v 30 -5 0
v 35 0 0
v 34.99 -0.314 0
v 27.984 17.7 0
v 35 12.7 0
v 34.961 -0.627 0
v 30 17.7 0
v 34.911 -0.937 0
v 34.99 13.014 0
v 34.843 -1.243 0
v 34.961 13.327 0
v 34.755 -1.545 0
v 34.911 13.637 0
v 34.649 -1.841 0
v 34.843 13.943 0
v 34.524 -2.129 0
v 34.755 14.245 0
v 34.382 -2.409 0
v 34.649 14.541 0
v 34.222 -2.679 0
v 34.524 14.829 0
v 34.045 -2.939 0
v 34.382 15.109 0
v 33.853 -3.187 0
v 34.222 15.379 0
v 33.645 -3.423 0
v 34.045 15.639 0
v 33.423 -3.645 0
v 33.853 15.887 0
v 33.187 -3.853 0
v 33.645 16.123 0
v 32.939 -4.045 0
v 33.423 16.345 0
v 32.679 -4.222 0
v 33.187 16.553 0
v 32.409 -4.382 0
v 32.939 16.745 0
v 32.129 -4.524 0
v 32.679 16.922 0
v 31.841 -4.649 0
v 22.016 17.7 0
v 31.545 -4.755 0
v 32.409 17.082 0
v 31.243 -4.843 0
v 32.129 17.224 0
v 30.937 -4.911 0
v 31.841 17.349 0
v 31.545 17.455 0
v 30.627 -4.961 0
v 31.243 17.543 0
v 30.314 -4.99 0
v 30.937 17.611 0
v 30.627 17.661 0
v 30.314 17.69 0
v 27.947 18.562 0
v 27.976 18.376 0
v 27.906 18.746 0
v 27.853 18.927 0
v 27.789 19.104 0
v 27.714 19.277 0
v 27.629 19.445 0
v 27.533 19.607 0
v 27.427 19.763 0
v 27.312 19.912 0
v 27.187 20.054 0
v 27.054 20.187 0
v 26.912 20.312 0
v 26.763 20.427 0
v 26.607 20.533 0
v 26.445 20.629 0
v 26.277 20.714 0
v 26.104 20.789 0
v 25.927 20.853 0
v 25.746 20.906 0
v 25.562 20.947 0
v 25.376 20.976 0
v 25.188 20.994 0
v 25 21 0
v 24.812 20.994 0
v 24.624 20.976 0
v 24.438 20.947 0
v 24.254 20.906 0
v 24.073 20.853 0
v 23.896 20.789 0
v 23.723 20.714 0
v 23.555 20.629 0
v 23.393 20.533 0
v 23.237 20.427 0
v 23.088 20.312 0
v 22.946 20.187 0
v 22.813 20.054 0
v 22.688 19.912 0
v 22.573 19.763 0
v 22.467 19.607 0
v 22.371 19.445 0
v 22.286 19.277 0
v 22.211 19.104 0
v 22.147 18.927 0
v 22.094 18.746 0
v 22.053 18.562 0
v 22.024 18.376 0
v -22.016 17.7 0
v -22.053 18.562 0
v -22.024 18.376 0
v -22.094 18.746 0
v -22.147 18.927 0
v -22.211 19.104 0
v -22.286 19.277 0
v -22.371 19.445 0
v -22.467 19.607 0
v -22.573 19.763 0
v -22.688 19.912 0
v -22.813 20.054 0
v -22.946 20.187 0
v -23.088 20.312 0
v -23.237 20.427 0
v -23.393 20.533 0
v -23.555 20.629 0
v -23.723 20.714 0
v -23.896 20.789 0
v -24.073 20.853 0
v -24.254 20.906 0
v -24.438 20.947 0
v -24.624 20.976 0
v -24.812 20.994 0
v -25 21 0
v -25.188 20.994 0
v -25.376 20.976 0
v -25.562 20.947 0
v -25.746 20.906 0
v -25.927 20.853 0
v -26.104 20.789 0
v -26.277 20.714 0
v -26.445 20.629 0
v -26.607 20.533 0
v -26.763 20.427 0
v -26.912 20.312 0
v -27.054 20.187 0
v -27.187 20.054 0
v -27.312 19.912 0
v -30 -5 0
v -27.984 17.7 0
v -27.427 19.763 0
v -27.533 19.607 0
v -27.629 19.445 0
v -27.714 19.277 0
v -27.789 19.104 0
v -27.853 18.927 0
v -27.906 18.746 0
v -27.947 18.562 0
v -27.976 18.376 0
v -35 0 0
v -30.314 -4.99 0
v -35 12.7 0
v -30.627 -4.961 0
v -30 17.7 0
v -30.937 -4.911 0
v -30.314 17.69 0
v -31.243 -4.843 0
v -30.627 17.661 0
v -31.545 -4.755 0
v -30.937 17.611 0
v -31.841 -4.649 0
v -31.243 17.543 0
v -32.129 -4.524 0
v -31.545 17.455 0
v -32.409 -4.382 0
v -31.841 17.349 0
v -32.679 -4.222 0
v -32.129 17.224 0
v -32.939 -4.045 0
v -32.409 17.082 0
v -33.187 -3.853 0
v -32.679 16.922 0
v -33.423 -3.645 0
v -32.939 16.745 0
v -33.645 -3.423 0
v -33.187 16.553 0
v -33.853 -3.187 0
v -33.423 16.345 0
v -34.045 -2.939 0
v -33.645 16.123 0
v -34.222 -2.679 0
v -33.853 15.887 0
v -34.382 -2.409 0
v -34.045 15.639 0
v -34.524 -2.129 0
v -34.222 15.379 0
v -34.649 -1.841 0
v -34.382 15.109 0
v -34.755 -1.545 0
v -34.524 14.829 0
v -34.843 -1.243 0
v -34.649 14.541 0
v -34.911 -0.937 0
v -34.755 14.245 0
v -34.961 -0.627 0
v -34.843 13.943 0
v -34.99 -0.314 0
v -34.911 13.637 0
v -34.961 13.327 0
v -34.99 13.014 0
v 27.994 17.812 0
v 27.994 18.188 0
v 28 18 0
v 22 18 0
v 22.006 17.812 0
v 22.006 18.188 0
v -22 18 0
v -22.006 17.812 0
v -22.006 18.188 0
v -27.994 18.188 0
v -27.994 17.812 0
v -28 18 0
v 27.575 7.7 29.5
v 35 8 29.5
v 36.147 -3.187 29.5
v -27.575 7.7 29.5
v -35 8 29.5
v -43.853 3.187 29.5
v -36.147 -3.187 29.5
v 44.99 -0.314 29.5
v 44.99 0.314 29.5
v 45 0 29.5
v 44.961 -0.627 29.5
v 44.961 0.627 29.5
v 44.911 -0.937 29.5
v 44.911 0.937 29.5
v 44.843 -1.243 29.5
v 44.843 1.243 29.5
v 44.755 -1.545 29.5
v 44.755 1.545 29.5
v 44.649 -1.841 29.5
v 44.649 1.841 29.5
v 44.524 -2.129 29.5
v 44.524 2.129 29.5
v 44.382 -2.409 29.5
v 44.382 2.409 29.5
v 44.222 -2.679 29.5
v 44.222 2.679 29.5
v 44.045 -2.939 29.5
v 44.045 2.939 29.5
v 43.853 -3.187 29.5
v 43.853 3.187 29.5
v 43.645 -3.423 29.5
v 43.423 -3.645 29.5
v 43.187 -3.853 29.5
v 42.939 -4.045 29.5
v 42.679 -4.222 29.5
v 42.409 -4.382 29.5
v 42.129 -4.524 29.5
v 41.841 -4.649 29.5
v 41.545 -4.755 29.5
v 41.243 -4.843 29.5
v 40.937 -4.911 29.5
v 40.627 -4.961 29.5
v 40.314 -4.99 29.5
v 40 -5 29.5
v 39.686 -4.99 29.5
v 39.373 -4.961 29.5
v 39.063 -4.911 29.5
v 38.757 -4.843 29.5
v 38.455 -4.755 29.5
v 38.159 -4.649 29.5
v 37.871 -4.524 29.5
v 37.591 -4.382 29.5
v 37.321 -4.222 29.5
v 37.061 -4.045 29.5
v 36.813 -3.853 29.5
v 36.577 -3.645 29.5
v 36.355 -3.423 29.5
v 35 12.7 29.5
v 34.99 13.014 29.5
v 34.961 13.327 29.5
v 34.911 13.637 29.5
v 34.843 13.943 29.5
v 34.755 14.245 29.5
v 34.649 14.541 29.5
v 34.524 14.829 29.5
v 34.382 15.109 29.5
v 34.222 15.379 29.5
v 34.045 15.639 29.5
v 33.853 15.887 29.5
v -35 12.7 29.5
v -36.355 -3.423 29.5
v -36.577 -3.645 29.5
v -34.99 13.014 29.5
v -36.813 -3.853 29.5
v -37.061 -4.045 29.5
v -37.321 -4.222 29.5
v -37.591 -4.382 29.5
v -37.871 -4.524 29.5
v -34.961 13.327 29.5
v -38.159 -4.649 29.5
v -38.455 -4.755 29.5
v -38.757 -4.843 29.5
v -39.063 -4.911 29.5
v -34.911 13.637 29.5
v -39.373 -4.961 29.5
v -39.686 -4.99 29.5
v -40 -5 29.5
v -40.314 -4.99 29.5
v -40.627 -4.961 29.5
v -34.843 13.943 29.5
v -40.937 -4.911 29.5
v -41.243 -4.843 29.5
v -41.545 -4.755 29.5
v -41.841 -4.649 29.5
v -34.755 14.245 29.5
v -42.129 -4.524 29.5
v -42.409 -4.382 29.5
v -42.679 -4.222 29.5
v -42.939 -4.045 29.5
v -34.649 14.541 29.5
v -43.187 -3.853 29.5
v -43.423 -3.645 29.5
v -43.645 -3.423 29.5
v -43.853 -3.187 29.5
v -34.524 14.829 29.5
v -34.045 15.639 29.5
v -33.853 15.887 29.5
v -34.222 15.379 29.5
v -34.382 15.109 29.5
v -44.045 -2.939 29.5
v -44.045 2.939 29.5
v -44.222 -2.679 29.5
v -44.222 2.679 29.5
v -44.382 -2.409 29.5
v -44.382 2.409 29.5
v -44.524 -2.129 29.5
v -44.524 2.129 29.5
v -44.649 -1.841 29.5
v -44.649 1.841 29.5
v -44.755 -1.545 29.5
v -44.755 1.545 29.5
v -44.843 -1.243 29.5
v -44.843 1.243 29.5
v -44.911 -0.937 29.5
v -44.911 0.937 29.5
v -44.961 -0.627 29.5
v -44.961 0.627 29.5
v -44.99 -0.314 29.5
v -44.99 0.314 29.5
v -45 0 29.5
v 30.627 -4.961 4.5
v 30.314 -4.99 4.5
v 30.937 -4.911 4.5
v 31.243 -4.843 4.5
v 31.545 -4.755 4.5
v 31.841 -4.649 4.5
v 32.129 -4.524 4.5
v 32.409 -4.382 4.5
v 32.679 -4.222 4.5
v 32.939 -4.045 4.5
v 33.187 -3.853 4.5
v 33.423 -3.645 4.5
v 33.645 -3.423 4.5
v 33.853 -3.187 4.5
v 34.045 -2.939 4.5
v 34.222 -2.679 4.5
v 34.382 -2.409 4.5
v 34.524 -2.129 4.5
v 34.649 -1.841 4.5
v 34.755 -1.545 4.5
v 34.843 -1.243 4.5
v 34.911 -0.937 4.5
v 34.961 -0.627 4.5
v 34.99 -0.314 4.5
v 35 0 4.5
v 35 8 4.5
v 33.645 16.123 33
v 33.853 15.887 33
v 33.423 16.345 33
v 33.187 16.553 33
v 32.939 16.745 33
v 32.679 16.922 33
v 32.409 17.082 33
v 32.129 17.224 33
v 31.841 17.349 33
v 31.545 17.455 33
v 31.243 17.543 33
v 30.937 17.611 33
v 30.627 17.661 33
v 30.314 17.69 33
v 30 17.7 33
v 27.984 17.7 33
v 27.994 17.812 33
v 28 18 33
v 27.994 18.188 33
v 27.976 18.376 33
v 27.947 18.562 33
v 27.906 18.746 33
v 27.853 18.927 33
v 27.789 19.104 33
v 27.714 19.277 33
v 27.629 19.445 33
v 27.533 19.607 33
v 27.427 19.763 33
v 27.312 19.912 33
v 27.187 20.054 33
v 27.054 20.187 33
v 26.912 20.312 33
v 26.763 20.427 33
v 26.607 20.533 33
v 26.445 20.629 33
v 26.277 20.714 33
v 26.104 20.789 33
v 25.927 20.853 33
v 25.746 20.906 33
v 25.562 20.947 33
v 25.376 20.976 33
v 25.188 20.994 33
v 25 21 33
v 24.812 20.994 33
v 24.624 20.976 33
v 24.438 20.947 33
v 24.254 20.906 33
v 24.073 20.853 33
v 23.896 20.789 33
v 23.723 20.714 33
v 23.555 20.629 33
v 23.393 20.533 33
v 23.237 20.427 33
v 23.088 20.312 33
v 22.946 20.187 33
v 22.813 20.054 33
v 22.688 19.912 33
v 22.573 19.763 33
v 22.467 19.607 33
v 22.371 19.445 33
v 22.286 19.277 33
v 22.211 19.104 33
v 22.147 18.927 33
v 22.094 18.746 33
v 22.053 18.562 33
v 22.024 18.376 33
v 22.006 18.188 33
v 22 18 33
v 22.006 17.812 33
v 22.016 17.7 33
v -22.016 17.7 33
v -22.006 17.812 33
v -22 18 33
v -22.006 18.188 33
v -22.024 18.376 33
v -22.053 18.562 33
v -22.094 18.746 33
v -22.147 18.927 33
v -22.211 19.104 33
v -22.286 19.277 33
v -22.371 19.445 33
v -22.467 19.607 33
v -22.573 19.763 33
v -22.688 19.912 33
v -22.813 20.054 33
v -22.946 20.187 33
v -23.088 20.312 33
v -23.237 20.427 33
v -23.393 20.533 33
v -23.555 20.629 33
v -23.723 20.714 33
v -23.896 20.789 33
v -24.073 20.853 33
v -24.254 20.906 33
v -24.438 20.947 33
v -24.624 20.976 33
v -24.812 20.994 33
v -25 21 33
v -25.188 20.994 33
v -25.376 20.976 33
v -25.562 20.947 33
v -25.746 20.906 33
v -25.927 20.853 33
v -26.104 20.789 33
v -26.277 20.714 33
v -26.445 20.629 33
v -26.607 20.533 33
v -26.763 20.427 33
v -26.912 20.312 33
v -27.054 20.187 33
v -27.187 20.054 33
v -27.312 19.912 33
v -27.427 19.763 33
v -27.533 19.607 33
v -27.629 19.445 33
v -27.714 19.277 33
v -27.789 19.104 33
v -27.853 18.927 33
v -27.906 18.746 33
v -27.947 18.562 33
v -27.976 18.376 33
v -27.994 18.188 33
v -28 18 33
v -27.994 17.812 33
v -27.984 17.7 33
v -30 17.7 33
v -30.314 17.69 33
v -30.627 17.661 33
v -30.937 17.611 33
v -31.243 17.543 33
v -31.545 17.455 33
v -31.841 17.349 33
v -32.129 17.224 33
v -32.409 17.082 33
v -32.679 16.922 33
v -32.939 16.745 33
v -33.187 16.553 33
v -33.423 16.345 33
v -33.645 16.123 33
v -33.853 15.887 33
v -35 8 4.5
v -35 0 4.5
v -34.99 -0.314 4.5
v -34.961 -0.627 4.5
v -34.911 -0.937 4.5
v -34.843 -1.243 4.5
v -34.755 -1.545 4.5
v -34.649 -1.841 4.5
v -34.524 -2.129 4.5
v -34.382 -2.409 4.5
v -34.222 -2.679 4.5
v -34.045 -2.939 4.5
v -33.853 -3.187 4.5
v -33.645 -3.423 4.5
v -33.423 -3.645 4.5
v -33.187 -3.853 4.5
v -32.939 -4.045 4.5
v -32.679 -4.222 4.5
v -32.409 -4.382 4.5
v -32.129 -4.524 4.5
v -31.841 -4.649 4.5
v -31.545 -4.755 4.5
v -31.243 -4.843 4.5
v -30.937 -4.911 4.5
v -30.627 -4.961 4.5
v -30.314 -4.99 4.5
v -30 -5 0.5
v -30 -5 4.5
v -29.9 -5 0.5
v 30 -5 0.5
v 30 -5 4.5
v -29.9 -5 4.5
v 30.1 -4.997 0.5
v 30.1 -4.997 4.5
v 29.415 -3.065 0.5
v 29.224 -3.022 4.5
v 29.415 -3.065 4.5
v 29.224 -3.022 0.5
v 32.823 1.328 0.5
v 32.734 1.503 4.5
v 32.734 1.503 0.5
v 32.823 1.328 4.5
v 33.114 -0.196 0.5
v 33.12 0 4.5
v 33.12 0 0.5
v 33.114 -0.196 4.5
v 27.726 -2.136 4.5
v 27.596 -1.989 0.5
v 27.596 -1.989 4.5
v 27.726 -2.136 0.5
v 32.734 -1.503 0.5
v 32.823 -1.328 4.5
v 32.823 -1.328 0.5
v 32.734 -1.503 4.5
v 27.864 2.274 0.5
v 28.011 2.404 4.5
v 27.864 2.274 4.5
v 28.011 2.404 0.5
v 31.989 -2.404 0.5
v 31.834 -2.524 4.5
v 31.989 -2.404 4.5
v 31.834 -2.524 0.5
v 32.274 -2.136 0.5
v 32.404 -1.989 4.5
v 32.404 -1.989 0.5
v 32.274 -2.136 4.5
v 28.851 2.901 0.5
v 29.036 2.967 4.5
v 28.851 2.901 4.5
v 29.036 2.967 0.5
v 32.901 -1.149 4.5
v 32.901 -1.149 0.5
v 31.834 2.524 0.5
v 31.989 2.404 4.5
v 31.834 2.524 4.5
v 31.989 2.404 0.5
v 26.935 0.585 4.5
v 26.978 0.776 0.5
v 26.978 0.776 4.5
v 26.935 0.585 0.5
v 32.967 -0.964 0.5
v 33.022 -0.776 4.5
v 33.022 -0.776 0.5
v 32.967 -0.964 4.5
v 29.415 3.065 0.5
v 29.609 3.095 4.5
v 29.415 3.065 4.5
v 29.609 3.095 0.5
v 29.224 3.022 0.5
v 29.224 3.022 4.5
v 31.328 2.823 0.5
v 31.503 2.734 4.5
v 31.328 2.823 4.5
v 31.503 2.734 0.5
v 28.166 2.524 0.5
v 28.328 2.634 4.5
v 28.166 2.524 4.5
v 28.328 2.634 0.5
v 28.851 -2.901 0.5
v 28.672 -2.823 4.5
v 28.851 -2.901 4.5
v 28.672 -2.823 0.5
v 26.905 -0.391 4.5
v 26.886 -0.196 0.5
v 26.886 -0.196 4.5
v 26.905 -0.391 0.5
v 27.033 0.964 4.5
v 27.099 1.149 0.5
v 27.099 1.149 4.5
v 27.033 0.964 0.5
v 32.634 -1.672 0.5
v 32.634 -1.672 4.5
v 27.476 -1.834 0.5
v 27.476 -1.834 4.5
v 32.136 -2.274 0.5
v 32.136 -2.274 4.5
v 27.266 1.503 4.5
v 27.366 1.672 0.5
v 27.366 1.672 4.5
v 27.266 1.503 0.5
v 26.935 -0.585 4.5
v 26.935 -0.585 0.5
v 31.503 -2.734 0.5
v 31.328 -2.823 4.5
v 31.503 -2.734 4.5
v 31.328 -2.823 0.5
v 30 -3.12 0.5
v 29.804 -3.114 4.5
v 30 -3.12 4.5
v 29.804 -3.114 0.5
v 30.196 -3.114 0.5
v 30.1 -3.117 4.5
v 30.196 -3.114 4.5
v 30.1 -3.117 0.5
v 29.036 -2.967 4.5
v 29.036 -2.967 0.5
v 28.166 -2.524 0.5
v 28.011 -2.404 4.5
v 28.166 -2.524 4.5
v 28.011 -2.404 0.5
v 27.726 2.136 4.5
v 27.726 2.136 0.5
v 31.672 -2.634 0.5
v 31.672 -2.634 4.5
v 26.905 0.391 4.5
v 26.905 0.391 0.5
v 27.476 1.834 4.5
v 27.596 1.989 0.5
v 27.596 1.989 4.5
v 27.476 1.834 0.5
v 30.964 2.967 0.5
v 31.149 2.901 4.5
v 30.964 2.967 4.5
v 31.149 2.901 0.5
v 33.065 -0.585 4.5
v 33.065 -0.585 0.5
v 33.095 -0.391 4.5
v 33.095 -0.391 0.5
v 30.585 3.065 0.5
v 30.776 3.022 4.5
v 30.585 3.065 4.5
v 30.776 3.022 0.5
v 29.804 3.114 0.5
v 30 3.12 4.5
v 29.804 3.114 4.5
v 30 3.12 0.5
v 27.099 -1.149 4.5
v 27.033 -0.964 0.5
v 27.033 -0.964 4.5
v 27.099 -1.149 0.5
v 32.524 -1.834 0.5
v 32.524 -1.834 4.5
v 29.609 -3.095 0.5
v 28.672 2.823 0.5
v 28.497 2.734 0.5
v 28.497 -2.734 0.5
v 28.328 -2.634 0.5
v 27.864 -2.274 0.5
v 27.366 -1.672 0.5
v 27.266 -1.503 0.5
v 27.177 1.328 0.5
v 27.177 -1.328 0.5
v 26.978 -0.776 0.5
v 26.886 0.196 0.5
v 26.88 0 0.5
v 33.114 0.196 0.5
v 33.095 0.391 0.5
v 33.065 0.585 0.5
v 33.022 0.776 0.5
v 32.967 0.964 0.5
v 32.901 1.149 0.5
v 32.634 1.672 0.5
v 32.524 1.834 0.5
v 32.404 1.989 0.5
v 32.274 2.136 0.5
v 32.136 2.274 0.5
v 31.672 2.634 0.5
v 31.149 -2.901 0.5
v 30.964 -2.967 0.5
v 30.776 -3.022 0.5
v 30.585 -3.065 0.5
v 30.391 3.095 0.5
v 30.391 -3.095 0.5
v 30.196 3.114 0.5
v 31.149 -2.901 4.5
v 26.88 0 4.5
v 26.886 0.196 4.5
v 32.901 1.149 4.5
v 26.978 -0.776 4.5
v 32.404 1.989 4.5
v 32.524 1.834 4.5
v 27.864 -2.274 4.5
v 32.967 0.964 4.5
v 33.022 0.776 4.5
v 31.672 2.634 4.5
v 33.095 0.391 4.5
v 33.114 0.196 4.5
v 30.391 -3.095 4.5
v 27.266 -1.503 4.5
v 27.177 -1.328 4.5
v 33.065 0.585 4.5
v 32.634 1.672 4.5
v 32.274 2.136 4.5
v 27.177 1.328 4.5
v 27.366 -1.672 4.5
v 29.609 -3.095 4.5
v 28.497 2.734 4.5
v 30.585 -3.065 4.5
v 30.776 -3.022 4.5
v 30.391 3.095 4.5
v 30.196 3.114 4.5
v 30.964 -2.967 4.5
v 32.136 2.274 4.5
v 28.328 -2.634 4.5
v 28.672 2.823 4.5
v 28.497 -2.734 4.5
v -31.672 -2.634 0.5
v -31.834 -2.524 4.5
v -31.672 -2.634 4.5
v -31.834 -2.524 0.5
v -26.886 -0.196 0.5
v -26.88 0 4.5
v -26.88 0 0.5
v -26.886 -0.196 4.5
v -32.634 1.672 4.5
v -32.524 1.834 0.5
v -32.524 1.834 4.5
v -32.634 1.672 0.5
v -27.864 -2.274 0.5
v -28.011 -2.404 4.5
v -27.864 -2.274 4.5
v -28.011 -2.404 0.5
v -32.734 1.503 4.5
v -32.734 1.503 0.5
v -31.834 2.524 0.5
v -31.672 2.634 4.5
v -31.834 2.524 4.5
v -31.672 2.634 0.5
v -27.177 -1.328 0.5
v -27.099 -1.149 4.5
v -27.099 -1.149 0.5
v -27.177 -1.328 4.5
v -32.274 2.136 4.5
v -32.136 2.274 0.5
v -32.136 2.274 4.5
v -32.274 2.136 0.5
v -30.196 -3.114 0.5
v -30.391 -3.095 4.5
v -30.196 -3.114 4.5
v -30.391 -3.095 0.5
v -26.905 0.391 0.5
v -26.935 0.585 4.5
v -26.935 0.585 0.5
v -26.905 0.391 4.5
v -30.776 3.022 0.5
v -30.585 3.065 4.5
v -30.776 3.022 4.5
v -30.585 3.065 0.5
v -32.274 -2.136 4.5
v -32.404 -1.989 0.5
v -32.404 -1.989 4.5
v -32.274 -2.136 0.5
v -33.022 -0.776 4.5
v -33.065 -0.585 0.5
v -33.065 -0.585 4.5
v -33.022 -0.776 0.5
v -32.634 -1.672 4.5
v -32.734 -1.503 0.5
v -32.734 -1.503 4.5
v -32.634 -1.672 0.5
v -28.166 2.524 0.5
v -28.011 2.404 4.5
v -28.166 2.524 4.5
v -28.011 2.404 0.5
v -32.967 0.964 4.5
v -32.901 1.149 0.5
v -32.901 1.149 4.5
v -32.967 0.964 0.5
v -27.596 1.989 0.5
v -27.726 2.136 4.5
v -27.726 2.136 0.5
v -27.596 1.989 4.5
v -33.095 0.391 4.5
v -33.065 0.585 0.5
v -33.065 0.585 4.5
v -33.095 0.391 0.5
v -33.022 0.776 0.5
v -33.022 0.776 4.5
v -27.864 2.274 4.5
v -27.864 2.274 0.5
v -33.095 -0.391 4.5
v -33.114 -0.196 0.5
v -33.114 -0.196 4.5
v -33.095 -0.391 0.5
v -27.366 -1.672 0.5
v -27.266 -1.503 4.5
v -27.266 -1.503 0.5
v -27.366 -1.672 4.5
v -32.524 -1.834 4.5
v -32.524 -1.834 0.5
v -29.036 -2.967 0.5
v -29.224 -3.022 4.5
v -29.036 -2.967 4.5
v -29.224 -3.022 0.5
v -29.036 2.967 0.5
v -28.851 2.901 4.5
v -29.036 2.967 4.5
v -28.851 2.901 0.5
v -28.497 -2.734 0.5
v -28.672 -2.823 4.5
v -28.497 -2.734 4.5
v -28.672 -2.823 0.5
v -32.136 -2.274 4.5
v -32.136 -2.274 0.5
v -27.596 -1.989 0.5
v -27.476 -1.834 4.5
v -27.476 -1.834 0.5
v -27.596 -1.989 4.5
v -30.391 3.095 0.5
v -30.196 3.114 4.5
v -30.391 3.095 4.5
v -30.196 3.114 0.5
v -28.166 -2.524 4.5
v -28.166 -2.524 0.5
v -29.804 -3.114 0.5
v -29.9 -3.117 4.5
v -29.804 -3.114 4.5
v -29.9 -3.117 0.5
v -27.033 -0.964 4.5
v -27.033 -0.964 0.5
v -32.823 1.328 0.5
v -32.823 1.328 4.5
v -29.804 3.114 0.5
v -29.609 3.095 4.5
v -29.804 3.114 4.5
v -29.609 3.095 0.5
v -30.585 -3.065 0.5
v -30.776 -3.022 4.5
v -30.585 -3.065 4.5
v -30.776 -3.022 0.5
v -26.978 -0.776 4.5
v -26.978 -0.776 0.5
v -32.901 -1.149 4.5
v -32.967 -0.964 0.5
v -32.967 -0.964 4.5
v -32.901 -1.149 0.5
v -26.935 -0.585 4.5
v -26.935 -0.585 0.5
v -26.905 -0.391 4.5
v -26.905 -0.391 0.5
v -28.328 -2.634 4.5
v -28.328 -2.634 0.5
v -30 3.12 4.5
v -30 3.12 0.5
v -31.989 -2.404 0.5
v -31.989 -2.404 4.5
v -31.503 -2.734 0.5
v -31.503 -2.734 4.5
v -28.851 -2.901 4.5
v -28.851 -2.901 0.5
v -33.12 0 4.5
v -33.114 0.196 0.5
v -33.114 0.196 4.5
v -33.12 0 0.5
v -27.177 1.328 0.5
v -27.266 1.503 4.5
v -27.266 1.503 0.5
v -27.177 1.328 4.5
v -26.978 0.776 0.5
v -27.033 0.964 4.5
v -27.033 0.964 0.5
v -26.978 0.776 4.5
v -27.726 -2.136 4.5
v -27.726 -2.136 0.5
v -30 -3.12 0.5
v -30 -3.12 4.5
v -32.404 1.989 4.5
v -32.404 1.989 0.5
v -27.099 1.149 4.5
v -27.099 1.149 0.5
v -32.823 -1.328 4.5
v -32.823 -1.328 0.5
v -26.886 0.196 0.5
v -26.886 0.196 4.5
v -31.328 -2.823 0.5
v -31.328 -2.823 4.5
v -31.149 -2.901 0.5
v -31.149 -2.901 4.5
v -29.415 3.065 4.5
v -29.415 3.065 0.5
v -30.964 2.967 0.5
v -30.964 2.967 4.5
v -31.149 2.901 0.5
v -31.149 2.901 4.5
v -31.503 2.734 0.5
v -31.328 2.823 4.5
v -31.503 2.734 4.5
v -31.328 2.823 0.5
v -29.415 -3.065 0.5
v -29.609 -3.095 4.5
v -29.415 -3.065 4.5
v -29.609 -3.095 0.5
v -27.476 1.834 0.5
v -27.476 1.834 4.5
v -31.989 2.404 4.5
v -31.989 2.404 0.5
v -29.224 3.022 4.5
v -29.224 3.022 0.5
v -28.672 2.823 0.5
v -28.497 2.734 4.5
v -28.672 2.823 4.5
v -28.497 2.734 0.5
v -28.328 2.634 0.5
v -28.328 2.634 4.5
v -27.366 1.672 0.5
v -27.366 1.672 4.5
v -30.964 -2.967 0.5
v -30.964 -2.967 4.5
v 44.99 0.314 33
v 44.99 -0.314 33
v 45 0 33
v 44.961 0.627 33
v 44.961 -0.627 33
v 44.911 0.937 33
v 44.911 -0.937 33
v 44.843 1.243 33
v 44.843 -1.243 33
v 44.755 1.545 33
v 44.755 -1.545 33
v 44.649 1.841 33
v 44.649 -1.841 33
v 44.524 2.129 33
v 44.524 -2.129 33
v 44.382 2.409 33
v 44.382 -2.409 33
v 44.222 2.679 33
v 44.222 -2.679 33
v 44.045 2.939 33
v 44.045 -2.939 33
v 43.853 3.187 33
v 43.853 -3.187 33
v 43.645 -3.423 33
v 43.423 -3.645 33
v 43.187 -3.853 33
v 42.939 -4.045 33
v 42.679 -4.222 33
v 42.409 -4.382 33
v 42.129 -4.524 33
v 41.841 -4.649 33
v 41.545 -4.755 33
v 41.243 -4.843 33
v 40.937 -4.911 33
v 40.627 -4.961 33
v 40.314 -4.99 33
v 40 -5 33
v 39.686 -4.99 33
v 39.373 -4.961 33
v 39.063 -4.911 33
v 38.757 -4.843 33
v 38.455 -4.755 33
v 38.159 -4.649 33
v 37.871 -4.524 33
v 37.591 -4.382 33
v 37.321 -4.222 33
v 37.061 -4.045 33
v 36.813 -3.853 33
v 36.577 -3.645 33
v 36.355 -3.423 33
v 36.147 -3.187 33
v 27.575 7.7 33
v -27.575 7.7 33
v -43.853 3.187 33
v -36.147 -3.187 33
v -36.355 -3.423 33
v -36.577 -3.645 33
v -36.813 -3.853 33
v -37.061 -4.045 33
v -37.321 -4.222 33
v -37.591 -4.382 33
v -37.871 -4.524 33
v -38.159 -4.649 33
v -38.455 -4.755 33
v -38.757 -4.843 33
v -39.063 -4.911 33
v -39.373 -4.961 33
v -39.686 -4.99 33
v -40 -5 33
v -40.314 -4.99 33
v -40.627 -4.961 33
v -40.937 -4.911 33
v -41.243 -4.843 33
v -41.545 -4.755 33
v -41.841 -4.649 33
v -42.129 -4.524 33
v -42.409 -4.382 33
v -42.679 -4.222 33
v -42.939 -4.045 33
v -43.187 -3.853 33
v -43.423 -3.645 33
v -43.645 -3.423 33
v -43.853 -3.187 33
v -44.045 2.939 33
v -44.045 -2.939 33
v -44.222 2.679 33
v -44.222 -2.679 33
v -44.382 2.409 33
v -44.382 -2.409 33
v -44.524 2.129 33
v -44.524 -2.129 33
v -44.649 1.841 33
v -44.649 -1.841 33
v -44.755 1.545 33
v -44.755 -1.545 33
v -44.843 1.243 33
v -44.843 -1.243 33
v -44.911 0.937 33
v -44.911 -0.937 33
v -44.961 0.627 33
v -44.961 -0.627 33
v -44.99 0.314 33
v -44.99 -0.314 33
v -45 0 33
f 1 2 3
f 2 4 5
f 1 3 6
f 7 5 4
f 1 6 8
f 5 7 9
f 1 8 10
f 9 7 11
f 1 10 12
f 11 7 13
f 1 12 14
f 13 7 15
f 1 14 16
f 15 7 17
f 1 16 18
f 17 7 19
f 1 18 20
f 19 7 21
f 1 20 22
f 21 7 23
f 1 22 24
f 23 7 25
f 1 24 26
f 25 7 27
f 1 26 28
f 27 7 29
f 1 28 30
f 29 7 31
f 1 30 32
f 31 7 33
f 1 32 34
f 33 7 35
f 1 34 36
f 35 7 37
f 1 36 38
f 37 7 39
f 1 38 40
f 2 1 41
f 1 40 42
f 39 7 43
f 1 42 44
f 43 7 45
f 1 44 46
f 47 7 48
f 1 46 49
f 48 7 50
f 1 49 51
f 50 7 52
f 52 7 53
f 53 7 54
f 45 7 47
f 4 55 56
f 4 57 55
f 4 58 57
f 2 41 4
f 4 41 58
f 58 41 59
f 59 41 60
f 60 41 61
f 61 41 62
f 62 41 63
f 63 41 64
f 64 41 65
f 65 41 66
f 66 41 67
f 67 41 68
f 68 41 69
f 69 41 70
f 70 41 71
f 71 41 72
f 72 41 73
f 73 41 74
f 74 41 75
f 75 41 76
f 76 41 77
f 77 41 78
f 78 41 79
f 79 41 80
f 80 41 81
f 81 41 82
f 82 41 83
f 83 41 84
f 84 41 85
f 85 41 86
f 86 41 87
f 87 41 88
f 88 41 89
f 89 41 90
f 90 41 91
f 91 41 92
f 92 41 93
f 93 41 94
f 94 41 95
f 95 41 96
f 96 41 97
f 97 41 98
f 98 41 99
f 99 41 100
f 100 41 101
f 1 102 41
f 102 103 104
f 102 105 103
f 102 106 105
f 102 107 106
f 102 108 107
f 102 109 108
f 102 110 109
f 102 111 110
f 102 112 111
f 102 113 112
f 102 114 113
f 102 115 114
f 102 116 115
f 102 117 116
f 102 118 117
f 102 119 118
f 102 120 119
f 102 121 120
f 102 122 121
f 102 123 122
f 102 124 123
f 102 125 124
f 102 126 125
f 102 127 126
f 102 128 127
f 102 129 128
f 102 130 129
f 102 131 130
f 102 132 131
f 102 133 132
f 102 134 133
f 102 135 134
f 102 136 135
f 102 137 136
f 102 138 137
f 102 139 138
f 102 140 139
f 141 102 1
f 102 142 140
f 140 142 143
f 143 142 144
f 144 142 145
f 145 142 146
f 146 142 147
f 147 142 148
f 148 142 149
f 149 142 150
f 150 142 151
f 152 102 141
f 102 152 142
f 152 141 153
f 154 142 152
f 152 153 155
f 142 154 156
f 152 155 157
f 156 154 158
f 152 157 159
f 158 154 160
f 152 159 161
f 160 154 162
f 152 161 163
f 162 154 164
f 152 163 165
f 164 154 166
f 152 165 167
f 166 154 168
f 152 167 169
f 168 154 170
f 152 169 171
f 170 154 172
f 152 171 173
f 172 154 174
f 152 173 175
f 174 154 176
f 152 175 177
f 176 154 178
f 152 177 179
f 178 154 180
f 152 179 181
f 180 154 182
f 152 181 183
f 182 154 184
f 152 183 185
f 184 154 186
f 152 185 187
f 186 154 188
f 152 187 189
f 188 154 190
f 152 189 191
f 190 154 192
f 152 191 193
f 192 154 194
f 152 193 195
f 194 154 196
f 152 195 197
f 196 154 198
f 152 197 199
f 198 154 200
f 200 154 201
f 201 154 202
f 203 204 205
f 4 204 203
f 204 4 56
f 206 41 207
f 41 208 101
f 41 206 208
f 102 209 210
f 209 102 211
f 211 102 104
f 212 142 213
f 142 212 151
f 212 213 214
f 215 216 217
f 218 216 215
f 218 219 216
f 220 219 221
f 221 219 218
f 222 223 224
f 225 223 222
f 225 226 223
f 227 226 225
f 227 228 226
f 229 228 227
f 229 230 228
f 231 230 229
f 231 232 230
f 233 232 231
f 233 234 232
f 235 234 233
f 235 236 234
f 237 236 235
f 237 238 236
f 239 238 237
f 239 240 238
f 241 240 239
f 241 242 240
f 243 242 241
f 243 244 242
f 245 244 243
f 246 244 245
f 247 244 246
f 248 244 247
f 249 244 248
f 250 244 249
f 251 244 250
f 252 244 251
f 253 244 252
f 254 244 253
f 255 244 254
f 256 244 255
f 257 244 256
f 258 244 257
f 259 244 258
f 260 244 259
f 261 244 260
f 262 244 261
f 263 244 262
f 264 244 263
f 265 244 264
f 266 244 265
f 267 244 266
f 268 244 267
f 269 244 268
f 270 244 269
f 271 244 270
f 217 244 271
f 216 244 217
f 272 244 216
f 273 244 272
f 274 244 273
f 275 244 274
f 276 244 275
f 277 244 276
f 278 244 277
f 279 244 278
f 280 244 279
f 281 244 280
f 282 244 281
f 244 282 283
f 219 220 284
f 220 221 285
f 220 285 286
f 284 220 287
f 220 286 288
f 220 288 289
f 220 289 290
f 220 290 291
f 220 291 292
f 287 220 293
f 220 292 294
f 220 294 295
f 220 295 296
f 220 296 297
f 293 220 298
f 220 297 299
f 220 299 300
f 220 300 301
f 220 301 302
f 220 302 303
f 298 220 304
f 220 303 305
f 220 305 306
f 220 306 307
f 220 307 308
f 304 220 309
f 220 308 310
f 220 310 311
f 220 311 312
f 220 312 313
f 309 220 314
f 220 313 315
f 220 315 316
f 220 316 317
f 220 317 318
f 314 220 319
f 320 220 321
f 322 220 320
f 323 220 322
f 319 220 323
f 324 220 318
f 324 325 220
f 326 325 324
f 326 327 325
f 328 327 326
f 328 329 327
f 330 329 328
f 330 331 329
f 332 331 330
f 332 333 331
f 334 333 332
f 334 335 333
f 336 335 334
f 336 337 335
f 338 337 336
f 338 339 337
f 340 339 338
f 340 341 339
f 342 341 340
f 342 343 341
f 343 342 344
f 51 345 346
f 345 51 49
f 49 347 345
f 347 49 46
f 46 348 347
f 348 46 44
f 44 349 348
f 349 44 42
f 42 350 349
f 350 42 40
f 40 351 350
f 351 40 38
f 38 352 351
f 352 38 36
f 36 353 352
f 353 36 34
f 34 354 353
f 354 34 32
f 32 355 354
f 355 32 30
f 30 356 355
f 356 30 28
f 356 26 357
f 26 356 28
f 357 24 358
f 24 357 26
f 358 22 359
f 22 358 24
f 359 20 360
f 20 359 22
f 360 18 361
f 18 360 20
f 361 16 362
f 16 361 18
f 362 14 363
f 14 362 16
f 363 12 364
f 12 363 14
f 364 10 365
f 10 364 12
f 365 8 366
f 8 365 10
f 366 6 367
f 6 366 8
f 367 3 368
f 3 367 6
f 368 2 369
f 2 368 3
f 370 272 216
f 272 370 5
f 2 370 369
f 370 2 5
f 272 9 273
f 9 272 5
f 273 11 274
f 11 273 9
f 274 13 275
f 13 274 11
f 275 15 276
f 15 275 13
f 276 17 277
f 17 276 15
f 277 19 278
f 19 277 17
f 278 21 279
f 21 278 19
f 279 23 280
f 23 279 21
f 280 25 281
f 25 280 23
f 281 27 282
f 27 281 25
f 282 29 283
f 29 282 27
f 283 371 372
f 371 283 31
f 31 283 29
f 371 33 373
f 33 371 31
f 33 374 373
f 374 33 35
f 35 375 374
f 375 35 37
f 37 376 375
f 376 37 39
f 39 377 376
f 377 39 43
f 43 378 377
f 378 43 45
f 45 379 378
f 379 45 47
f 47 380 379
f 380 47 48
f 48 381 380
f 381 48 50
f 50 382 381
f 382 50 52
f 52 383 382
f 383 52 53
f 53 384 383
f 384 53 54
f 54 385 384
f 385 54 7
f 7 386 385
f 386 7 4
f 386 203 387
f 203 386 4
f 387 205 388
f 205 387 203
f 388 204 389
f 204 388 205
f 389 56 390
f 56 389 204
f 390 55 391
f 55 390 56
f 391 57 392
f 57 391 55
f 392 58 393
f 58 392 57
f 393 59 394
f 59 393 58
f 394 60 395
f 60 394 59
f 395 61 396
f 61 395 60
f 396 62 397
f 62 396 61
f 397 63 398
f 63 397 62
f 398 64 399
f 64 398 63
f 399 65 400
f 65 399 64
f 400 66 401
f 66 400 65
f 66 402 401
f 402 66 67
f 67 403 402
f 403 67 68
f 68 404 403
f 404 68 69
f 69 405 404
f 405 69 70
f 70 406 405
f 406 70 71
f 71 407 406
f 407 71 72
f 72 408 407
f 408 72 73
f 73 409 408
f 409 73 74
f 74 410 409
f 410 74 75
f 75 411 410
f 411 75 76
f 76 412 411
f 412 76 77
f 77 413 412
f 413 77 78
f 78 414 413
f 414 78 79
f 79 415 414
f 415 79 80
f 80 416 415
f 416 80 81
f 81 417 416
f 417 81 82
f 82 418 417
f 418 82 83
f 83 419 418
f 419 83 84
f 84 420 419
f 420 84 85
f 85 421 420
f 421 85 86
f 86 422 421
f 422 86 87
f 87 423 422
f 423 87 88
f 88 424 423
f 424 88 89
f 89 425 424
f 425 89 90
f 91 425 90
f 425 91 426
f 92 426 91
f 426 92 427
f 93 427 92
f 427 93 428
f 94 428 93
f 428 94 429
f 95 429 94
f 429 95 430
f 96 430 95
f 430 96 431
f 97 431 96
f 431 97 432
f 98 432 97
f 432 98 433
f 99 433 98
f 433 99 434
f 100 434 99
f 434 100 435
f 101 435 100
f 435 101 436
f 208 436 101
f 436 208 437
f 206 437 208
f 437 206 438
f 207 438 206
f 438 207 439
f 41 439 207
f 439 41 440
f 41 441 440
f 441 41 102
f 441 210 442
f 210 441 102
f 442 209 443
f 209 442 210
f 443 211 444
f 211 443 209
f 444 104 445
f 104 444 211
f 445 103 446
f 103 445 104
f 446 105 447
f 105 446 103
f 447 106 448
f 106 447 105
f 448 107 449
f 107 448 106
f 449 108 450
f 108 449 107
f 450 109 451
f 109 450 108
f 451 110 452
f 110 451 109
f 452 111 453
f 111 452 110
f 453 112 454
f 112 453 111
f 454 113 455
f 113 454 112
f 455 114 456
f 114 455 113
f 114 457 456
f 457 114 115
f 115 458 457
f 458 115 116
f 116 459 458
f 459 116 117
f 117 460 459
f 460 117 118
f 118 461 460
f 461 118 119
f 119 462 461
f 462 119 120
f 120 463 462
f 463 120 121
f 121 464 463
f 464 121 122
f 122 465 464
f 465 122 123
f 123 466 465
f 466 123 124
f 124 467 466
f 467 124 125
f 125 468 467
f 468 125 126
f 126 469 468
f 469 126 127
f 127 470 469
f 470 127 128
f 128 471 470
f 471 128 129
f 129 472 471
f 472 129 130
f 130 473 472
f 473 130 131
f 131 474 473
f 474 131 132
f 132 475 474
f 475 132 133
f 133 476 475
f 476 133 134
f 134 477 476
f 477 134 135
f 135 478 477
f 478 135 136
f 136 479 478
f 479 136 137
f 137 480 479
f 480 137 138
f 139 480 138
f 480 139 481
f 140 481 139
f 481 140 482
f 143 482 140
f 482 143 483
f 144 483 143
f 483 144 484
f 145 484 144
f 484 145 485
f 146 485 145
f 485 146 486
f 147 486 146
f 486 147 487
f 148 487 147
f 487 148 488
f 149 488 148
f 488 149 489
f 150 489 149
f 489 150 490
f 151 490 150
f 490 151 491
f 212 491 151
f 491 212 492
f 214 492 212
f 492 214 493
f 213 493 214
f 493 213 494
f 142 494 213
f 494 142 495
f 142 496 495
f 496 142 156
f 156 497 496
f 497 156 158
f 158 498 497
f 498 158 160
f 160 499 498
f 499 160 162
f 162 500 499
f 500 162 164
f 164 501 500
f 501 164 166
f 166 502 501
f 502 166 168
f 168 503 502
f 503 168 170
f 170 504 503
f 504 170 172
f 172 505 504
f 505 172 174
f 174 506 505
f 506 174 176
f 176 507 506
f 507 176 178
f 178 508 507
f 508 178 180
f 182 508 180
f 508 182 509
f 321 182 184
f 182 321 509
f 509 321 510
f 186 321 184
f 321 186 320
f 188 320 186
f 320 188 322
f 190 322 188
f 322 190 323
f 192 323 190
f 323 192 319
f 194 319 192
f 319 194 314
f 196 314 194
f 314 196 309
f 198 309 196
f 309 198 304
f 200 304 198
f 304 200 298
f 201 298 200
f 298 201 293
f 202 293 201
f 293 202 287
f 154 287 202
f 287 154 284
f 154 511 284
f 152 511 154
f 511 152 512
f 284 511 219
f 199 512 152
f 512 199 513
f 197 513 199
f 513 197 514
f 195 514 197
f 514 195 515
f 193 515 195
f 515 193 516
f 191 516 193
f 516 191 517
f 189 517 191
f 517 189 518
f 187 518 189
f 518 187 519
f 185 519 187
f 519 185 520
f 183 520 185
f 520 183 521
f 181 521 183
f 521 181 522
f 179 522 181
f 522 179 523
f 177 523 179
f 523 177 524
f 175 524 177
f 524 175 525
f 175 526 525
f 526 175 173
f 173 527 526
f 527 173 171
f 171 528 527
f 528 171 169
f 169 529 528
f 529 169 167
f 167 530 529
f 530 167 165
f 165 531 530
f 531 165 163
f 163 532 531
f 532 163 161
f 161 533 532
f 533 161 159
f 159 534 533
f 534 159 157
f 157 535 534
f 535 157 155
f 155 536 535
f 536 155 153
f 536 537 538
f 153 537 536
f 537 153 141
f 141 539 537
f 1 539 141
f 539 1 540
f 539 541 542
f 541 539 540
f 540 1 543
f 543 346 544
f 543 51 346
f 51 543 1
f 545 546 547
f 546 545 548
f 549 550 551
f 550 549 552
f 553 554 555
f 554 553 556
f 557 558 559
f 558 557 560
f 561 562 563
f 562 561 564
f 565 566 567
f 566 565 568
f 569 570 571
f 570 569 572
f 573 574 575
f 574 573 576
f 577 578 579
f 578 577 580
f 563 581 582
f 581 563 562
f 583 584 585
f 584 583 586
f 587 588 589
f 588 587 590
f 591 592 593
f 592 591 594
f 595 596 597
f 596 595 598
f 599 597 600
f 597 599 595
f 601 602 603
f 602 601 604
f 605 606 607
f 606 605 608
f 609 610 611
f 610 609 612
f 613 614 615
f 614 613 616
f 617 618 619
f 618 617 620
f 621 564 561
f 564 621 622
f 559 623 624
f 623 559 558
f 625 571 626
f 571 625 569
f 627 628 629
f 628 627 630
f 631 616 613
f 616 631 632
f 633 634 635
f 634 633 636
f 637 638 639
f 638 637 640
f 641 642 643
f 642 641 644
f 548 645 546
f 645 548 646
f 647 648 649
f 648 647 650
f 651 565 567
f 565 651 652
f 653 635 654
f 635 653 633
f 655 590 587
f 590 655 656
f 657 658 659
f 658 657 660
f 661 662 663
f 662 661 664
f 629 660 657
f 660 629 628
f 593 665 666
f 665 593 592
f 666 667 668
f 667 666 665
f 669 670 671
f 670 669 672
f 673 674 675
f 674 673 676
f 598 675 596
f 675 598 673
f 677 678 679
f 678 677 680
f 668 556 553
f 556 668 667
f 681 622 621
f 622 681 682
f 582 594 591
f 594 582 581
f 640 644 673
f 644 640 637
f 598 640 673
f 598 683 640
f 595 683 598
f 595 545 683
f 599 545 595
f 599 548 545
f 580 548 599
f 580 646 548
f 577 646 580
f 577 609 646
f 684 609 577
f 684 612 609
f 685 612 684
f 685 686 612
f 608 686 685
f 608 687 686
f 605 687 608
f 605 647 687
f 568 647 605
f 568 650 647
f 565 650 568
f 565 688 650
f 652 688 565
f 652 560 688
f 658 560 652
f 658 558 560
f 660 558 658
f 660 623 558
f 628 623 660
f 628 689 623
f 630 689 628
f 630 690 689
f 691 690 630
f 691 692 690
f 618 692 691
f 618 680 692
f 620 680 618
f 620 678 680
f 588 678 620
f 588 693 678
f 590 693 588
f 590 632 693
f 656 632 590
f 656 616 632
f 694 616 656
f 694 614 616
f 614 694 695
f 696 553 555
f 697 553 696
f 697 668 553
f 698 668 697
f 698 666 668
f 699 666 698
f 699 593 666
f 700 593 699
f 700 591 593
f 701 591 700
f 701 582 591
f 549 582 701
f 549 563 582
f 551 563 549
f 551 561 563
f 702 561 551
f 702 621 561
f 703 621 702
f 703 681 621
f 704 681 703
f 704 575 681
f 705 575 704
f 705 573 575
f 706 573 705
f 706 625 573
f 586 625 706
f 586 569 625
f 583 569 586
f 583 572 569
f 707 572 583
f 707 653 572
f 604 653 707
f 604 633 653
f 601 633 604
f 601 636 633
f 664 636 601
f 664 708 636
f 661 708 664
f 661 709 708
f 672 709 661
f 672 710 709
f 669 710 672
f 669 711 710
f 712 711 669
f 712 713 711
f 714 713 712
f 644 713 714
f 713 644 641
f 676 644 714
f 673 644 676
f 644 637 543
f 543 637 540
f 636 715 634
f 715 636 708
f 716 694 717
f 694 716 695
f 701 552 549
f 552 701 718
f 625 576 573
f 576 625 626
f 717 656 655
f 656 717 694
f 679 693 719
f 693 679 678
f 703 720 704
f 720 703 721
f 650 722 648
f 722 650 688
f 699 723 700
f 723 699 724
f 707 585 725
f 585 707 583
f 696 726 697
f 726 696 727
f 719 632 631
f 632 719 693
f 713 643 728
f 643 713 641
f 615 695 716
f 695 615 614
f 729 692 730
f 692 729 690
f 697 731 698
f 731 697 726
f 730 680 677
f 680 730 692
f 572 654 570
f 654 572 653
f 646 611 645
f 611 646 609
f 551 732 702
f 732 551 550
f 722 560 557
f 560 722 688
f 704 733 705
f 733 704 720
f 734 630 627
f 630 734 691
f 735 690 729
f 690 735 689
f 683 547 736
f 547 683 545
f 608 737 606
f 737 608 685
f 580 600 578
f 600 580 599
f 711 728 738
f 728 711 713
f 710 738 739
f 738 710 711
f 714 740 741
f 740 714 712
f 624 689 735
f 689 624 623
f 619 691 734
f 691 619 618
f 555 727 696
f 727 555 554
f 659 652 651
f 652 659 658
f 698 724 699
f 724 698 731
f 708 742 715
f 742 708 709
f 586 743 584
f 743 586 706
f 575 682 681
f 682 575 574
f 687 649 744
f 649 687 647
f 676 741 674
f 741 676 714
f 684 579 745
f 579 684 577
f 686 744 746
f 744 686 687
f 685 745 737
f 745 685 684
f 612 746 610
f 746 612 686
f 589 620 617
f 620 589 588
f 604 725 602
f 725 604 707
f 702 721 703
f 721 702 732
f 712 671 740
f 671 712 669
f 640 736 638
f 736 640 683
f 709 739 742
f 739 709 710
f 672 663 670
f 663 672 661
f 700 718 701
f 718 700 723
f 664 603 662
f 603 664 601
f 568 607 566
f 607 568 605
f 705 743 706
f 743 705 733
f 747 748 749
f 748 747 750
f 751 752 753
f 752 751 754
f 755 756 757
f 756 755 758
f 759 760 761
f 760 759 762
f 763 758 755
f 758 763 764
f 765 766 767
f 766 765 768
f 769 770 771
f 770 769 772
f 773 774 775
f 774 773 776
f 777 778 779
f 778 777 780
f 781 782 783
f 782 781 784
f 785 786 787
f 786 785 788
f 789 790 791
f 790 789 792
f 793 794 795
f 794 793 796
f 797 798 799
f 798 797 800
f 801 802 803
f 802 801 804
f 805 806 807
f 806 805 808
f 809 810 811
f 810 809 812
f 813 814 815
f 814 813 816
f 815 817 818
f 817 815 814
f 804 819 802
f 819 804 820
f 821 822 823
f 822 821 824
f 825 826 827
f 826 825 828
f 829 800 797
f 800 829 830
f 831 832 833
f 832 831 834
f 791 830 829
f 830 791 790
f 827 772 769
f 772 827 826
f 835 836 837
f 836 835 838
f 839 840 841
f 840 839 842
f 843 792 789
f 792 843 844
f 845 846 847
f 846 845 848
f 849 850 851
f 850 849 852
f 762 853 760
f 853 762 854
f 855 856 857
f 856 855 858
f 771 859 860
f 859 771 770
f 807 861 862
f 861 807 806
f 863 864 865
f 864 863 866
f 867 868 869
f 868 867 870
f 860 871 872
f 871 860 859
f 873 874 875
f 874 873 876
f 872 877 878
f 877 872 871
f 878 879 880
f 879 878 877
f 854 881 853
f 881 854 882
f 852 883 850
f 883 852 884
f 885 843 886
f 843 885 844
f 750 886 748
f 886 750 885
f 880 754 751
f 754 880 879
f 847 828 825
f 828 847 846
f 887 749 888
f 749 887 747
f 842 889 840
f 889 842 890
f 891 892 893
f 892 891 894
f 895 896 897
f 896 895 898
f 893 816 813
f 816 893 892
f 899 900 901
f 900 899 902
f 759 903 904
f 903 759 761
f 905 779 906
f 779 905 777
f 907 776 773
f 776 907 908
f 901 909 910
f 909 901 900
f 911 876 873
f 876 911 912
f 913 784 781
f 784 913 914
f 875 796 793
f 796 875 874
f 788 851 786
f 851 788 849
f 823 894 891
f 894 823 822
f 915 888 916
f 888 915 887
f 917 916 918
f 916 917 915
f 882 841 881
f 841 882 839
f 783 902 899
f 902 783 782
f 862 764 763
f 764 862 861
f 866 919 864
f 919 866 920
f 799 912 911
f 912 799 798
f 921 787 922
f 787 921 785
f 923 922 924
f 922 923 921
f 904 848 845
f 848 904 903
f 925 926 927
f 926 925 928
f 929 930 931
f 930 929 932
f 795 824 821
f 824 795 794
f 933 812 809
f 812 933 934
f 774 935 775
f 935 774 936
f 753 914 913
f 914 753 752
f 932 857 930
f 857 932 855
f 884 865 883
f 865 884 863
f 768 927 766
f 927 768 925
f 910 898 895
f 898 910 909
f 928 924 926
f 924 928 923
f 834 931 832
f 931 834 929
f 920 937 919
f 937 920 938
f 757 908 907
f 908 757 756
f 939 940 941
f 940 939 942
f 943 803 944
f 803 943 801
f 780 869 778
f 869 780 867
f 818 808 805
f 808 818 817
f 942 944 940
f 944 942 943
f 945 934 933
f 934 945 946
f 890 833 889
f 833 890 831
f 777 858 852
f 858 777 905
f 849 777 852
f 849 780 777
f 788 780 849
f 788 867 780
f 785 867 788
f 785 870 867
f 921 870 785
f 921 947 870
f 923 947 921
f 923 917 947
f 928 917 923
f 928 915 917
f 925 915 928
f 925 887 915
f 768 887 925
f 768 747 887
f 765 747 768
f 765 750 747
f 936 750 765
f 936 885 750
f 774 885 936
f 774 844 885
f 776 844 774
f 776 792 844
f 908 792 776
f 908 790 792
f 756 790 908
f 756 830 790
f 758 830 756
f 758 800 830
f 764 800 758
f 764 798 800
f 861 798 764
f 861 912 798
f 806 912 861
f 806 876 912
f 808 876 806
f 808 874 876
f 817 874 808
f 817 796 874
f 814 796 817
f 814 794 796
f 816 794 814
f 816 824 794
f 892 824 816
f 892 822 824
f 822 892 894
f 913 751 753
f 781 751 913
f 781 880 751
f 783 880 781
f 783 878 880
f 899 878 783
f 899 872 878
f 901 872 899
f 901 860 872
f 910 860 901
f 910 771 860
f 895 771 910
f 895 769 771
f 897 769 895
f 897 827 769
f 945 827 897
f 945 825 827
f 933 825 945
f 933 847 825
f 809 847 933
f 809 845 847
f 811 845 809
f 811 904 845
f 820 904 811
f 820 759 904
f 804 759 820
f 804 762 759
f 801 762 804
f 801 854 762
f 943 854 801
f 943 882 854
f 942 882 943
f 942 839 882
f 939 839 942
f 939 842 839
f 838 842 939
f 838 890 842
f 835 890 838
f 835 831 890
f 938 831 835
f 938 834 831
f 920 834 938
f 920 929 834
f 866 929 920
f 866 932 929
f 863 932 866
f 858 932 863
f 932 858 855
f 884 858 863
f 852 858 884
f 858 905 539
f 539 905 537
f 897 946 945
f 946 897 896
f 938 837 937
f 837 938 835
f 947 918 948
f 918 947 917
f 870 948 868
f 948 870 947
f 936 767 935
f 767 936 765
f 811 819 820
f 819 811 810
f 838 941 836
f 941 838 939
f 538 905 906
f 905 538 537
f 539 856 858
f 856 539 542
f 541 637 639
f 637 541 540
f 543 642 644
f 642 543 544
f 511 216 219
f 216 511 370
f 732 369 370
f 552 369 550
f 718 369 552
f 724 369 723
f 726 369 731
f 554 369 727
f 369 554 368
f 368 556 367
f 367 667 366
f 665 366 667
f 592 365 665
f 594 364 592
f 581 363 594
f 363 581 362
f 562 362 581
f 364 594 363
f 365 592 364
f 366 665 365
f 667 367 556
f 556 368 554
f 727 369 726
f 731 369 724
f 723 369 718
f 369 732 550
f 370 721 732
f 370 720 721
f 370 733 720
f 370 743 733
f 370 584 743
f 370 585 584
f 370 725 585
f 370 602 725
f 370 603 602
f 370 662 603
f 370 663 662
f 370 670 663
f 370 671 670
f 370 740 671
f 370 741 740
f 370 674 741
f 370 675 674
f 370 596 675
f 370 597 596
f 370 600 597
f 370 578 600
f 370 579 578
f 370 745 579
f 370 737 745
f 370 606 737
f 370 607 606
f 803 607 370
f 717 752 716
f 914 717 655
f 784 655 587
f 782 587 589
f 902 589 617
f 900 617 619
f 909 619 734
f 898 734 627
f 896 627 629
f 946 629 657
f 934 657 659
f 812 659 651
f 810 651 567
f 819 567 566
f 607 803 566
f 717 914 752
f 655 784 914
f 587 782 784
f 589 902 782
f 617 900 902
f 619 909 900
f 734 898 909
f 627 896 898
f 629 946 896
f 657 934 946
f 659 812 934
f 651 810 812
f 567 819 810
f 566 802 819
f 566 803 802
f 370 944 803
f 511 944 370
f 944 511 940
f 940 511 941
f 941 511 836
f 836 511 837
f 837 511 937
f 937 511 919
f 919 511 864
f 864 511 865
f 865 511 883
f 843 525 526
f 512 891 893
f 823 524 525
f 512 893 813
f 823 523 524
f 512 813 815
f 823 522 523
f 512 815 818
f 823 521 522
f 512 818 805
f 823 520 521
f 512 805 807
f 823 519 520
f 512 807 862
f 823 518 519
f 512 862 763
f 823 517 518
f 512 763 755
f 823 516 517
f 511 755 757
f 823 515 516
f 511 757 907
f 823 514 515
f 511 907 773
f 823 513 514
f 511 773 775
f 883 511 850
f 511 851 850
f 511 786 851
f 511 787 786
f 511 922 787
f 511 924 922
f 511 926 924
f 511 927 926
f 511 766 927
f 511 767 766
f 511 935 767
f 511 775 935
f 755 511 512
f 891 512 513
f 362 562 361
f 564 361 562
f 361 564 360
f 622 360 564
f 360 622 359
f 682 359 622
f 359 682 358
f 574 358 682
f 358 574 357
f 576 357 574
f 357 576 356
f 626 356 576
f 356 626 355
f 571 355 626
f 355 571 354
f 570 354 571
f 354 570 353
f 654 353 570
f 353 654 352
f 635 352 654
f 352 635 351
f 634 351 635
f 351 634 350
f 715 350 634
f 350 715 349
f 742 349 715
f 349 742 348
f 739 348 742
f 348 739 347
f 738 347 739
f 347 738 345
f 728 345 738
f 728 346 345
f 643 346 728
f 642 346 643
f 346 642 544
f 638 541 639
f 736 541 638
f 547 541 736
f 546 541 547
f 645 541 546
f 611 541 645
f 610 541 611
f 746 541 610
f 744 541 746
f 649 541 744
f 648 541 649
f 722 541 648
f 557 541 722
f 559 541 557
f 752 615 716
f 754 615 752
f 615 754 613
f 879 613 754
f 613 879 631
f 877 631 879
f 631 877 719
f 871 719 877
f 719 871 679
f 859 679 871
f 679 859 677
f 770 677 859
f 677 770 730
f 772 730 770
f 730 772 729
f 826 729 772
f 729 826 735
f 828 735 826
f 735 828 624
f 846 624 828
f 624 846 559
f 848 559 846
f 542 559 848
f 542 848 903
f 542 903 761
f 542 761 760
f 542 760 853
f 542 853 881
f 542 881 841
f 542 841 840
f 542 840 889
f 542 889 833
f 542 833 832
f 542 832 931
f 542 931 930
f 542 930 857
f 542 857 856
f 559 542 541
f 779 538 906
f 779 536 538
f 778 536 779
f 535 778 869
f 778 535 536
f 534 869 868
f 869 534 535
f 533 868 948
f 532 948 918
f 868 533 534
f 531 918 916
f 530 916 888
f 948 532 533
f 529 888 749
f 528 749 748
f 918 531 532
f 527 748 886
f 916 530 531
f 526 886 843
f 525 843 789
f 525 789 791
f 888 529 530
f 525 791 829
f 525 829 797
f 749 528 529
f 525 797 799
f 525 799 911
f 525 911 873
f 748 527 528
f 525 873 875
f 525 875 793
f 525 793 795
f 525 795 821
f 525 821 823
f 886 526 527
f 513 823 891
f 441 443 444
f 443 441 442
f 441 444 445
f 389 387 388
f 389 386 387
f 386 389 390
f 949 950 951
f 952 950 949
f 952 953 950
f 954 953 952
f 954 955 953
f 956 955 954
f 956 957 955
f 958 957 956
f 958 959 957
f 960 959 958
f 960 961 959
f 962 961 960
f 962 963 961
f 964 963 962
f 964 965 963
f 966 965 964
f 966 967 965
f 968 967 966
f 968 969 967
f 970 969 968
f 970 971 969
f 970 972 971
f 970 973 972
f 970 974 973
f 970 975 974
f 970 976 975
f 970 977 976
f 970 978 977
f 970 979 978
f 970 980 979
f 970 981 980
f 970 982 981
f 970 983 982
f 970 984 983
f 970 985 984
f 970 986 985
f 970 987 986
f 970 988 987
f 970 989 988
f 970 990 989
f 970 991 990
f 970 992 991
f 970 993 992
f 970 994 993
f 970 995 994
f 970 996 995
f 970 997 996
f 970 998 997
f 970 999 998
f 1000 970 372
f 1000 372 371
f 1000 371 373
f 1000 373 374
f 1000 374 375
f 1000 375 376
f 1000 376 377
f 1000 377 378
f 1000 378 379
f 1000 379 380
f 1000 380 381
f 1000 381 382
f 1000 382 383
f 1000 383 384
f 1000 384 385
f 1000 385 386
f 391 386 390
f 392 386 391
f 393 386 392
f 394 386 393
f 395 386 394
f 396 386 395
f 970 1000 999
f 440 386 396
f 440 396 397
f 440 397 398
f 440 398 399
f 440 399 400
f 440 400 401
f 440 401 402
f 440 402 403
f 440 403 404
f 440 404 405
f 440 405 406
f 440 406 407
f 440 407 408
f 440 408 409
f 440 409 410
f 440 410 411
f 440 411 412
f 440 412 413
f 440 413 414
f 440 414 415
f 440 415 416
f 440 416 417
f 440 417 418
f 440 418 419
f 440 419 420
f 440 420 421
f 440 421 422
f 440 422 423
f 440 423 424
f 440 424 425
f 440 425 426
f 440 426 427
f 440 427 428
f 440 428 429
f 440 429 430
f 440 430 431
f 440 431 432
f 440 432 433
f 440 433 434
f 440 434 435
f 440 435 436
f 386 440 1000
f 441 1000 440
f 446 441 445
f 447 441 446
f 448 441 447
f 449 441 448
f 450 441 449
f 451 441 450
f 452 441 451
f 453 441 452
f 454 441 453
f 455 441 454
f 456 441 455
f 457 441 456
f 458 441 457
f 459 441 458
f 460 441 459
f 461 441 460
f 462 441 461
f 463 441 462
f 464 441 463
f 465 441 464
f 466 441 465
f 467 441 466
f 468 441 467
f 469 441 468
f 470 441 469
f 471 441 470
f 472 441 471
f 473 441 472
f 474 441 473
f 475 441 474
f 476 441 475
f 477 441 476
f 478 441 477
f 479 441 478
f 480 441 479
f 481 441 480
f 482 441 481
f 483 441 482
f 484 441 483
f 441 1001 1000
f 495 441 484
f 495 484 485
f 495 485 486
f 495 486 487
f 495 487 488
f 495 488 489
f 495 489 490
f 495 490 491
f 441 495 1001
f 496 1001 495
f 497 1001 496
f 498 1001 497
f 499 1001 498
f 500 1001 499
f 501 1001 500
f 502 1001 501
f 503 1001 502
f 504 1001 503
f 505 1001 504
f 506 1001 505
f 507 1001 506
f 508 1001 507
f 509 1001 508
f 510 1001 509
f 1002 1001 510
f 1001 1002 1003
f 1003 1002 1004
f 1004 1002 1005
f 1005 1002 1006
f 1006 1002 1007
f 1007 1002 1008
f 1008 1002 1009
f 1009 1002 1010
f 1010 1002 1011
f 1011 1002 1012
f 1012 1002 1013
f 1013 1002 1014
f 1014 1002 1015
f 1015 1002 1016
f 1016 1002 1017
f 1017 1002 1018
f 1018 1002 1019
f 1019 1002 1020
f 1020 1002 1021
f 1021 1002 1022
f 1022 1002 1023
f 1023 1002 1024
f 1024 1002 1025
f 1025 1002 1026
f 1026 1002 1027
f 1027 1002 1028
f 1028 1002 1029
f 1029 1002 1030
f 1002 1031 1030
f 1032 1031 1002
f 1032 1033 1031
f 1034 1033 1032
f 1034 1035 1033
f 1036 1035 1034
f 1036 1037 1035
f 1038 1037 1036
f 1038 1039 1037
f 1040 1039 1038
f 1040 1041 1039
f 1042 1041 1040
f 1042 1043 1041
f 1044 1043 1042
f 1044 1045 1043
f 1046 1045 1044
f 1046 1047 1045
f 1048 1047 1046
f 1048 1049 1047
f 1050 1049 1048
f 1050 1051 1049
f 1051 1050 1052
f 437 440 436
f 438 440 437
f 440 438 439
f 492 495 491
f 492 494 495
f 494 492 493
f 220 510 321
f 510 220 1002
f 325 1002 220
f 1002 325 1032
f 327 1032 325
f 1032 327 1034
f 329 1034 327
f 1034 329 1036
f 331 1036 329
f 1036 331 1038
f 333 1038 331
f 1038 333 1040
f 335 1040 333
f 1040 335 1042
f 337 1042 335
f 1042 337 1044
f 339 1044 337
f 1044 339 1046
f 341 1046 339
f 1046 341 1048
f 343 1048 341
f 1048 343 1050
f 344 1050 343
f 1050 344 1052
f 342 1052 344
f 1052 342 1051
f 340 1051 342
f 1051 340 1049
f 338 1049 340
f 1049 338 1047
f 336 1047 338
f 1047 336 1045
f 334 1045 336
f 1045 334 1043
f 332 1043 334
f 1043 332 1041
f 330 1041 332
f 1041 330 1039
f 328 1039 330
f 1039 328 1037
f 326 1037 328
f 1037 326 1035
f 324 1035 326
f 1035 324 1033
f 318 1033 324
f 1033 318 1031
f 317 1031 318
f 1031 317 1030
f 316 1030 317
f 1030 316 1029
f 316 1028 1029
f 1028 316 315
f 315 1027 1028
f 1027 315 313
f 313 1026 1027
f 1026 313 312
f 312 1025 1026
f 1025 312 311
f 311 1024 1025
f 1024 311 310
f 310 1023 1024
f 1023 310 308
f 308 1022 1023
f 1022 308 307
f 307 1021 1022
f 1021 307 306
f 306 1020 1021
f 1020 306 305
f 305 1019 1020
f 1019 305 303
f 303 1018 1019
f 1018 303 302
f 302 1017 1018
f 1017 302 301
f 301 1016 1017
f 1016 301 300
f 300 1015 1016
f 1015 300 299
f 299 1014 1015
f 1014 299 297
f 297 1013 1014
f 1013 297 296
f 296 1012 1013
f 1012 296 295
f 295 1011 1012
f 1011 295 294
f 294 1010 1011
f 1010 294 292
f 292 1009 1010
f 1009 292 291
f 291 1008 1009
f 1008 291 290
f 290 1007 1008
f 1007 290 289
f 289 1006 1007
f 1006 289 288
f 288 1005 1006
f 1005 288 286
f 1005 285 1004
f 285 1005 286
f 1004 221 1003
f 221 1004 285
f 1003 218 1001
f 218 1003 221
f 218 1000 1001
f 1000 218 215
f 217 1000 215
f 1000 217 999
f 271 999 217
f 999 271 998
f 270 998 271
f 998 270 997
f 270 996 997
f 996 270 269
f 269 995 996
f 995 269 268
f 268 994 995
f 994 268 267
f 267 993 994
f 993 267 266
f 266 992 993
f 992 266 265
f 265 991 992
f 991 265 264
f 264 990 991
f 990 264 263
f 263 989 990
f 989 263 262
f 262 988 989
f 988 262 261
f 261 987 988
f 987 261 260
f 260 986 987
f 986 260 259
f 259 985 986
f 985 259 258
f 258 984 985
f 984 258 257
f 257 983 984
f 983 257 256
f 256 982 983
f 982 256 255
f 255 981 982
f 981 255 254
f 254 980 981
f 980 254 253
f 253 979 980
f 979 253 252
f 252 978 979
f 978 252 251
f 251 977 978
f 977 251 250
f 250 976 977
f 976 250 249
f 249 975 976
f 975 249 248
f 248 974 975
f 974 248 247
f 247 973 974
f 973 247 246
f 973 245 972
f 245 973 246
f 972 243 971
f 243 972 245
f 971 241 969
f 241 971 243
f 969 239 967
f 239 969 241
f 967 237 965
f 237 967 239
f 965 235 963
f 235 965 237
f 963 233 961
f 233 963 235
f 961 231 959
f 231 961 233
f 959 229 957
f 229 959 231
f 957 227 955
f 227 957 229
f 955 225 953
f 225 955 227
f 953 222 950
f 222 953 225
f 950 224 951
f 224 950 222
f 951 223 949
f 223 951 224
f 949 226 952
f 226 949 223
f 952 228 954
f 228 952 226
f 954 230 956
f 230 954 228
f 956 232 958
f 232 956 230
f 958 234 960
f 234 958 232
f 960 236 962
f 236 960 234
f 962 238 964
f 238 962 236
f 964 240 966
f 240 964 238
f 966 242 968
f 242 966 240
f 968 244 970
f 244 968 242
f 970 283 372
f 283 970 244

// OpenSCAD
union(){
    difference(){
        linear_extrude(29.5)  union(){
            hull(){
                translate([30,12.7,0]) circle(5,$fn=100);
                translate([-30,12.7,0]) circle(5,$fn=100);
                translate([30,0,0]) circle(5,$fn=100);
                translate([-30,0,0]) circle(5,$fn=100);
            }
            translate([25,18,0]) circle(3,$fn=100);
            translate([-25,18,0]) circle(3,$fn=100);
        }
        // 磁石穴
        translate([30,0,0.5]) linear_extrude(4.5) circle(3.12,$fn=100);
        translate([-30,0,0.5]) linear_extrude(4.5) circle(3.12,$fn=100);
        // 線
        translate([-30,-5,0.5]) linear_extrude(4.5) square([0.1,2]);
        translate([30,-5,0.5]) linear_extrude(4.5) square([0.1,2]);
        // パーティション部分
        color("green")translate([0,0,4.5]) linear_extrude(25) hull(){
            translate([30,3,0]) square([5,5]);
            translate([-35,3,0]) square([5,5]);
            translate([30,0,0]) circle(5,$fn=100);
            translate([-30,0,0]) circle(5,$fn=100);
        }
    }
    translate([0,0,29.5]) linear_extrude(3.5){
        hull(){
            translate([30,12.7,0]) circle(5,$fn=100);
            translate([40,0,0]) circle(5,$fn=100);
        }
        hull(){
            translate([-30,12.7,0]) circle(5,$fn=100);
            translate([-40,0,0]) circle(5,$fn=100);
        }
        hull(){
            translate([30,12.7,0]) circle(5,$fn=100);
            translate([-30,12.7,0]) circle(5,$fn=100);
        }
        translate([25,18,0]) circle(3,$fn=100);
        translate([-25,18,0]) circle(3,$fn=100);
    }
}
